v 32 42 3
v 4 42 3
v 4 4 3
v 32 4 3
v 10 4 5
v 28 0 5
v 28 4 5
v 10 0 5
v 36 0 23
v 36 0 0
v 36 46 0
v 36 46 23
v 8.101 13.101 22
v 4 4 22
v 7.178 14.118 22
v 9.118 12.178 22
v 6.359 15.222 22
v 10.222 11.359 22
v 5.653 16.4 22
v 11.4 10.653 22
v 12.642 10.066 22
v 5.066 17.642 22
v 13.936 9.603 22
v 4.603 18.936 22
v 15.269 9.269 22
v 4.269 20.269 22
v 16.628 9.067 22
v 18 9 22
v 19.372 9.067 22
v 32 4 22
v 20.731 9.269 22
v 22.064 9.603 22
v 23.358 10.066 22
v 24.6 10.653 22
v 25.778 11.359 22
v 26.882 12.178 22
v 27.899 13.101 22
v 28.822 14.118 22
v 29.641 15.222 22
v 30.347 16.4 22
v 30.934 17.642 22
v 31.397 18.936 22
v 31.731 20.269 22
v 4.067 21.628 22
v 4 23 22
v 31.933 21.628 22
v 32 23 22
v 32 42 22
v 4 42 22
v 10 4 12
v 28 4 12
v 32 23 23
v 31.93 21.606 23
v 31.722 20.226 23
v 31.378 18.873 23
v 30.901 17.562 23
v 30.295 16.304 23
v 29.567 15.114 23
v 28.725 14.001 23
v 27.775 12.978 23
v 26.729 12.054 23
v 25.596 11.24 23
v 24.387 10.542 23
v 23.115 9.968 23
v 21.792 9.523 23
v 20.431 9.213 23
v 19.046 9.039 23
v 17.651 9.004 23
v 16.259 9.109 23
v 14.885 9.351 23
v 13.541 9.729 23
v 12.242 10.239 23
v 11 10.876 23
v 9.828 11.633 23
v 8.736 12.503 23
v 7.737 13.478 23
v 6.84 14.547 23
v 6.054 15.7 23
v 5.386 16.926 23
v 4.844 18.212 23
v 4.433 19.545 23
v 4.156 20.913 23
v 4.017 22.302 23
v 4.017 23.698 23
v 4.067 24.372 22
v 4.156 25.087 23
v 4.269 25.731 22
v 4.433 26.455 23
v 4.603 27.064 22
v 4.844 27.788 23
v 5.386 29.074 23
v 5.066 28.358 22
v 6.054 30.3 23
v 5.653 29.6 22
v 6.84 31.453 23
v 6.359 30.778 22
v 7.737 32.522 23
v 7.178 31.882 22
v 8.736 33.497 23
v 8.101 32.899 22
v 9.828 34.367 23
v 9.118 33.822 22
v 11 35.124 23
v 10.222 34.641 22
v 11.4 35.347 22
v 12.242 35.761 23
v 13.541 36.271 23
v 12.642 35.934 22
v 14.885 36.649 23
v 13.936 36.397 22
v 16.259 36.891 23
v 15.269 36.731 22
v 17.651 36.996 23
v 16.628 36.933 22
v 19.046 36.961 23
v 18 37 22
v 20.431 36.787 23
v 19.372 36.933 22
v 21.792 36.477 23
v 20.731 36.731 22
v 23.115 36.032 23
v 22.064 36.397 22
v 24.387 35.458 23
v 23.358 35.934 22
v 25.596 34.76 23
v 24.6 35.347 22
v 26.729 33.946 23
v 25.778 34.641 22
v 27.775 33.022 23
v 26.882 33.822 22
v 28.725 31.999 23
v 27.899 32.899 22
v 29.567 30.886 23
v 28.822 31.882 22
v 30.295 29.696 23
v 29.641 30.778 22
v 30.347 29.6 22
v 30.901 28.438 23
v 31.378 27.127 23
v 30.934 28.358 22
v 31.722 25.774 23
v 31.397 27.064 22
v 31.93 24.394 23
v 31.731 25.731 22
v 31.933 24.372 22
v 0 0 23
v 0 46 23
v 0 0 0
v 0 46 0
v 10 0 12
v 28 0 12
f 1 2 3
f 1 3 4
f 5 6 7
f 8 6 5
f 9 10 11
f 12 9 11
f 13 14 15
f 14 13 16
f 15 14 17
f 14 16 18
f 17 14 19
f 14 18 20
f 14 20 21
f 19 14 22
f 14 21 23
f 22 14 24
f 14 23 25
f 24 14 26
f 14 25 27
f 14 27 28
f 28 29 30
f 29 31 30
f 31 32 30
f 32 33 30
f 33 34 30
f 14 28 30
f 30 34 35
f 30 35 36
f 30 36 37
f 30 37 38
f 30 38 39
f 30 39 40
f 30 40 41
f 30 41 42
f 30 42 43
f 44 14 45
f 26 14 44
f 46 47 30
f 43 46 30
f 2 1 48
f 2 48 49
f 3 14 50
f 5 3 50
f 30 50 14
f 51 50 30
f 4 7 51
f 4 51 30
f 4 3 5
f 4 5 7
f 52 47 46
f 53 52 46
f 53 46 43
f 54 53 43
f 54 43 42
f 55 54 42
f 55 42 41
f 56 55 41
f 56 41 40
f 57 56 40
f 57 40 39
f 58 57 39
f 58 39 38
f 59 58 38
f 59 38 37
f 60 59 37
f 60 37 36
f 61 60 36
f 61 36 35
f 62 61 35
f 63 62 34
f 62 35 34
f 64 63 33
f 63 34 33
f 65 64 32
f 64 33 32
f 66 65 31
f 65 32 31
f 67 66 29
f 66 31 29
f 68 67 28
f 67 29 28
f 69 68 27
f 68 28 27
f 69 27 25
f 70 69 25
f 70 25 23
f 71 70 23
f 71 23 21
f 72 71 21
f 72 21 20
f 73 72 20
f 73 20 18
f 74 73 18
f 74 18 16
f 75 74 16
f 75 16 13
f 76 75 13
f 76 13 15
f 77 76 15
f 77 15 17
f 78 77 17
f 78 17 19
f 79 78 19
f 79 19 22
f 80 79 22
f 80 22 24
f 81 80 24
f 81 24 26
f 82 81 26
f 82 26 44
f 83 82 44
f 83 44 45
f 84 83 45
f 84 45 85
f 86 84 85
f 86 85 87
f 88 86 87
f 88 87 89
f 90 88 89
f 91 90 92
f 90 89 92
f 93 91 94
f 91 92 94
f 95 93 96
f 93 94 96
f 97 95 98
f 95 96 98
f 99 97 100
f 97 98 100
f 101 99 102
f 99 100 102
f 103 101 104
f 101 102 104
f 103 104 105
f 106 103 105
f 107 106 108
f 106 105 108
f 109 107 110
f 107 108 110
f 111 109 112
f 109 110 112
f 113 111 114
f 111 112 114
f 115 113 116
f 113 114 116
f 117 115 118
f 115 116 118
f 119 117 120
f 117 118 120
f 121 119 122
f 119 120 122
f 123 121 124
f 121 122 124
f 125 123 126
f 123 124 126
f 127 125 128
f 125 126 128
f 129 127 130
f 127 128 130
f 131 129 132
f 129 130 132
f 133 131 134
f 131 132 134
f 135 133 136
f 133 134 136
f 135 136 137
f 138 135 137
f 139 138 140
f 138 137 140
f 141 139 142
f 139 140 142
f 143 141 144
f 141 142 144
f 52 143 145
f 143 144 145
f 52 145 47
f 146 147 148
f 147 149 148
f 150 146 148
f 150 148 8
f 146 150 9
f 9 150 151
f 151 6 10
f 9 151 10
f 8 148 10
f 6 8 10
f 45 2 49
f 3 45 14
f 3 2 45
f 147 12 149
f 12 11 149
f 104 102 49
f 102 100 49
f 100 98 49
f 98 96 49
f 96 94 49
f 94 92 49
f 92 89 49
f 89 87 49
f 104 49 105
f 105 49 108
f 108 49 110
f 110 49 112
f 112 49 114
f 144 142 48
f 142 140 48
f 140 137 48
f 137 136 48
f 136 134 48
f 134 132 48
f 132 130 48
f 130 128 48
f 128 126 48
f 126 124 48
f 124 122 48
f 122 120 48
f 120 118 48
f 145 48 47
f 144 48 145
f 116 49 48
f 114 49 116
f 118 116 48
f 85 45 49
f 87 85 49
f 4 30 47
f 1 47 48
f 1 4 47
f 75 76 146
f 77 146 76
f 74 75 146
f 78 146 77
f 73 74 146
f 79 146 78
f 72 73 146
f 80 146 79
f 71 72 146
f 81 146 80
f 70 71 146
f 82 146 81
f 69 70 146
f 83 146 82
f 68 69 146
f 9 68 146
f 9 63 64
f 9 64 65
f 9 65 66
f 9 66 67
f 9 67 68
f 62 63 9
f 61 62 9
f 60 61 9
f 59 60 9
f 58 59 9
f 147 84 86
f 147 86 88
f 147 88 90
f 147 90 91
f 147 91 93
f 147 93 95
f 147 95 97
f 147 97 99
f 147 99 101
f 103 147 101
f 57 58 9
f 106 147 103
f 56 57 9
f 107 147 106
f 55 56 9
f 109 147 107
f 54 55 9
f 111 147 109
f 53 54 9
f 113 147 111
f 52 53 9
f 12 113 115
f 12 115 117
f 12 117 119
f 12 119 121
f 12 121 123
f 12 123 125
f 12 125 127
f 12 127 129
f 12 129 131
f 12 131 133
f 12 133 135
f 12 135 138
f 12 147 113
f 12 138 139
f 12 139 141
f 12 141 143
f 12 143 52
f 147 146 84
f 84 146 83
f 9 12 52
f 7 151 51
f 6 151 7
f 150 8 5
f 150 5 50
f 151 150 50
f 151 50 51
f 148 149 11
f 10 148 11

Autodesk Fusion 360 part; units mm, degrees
sketch "Sketch1" plane through (0, 0, 0) normal (0, 0, 1) x (1, 0, 0)
  line L0 (4, 4) -> (32, 4)
  line L1 (32, 4) -> (32, 42)
  line L2 (32, 42) -> (4, 42)
  line L3 (4, 42) -> (4, 4)
  line L4 (0, 0) -> (36, 0)
  line L5 (36, 0) -> (36, 46)
  line L6 (36, 46) -> (0, 46)
  line L7 (0, 46) -> (0, 0)
  circle A0 centre (18, 23) radius 14
  dimension "d1" = 28
  dimension "d2" = 38
  dimension "d3" = 36
  dimension "d4" = 46
  dimension "d5" = 4
  dimension "d6" = 4
extrude "Extrude1" add sketch "Sketch1" along normal blind 23
extrude "Extrude2" add sketch "Sketch1" along normal blind 3 contours L0 L1 L3 A0 | L1 L2 L3 A0 | A0
extrude "Extrude3" add sketch "Sketch1" along normal blind 1 from surface at 22 contours L0 L1 L3 A0 | L1 L2 L3 A0
sketch "Sketch2" plane through (0, 0, 0) normal (0, -1, 0) x (1, 0, 0)
  line L0 (0, 0) -> (36, 0)
  line L1 (36, 0) -> (36, 23)
  line L2 (36, 23) -> (0, 23)
  line L3 (0, 23) -> (0, 0)
  line L4 (10, 12) -> (28, 12)
  line L5 (28, 12) -> (28, 5)
  line L6 (28, 5) -> (10, 5)
  line L7 (10, 5) -> (10, 12)
  line L8 (0, 0) -> (36, 0)
  dimension "d14" = 18
  dimension "d15" = 7
  dimension "d16" = 5
extrude "Extrude4" cut sketch "Sketch2" against normal blind 4 contours L4 L5 L6 L7
